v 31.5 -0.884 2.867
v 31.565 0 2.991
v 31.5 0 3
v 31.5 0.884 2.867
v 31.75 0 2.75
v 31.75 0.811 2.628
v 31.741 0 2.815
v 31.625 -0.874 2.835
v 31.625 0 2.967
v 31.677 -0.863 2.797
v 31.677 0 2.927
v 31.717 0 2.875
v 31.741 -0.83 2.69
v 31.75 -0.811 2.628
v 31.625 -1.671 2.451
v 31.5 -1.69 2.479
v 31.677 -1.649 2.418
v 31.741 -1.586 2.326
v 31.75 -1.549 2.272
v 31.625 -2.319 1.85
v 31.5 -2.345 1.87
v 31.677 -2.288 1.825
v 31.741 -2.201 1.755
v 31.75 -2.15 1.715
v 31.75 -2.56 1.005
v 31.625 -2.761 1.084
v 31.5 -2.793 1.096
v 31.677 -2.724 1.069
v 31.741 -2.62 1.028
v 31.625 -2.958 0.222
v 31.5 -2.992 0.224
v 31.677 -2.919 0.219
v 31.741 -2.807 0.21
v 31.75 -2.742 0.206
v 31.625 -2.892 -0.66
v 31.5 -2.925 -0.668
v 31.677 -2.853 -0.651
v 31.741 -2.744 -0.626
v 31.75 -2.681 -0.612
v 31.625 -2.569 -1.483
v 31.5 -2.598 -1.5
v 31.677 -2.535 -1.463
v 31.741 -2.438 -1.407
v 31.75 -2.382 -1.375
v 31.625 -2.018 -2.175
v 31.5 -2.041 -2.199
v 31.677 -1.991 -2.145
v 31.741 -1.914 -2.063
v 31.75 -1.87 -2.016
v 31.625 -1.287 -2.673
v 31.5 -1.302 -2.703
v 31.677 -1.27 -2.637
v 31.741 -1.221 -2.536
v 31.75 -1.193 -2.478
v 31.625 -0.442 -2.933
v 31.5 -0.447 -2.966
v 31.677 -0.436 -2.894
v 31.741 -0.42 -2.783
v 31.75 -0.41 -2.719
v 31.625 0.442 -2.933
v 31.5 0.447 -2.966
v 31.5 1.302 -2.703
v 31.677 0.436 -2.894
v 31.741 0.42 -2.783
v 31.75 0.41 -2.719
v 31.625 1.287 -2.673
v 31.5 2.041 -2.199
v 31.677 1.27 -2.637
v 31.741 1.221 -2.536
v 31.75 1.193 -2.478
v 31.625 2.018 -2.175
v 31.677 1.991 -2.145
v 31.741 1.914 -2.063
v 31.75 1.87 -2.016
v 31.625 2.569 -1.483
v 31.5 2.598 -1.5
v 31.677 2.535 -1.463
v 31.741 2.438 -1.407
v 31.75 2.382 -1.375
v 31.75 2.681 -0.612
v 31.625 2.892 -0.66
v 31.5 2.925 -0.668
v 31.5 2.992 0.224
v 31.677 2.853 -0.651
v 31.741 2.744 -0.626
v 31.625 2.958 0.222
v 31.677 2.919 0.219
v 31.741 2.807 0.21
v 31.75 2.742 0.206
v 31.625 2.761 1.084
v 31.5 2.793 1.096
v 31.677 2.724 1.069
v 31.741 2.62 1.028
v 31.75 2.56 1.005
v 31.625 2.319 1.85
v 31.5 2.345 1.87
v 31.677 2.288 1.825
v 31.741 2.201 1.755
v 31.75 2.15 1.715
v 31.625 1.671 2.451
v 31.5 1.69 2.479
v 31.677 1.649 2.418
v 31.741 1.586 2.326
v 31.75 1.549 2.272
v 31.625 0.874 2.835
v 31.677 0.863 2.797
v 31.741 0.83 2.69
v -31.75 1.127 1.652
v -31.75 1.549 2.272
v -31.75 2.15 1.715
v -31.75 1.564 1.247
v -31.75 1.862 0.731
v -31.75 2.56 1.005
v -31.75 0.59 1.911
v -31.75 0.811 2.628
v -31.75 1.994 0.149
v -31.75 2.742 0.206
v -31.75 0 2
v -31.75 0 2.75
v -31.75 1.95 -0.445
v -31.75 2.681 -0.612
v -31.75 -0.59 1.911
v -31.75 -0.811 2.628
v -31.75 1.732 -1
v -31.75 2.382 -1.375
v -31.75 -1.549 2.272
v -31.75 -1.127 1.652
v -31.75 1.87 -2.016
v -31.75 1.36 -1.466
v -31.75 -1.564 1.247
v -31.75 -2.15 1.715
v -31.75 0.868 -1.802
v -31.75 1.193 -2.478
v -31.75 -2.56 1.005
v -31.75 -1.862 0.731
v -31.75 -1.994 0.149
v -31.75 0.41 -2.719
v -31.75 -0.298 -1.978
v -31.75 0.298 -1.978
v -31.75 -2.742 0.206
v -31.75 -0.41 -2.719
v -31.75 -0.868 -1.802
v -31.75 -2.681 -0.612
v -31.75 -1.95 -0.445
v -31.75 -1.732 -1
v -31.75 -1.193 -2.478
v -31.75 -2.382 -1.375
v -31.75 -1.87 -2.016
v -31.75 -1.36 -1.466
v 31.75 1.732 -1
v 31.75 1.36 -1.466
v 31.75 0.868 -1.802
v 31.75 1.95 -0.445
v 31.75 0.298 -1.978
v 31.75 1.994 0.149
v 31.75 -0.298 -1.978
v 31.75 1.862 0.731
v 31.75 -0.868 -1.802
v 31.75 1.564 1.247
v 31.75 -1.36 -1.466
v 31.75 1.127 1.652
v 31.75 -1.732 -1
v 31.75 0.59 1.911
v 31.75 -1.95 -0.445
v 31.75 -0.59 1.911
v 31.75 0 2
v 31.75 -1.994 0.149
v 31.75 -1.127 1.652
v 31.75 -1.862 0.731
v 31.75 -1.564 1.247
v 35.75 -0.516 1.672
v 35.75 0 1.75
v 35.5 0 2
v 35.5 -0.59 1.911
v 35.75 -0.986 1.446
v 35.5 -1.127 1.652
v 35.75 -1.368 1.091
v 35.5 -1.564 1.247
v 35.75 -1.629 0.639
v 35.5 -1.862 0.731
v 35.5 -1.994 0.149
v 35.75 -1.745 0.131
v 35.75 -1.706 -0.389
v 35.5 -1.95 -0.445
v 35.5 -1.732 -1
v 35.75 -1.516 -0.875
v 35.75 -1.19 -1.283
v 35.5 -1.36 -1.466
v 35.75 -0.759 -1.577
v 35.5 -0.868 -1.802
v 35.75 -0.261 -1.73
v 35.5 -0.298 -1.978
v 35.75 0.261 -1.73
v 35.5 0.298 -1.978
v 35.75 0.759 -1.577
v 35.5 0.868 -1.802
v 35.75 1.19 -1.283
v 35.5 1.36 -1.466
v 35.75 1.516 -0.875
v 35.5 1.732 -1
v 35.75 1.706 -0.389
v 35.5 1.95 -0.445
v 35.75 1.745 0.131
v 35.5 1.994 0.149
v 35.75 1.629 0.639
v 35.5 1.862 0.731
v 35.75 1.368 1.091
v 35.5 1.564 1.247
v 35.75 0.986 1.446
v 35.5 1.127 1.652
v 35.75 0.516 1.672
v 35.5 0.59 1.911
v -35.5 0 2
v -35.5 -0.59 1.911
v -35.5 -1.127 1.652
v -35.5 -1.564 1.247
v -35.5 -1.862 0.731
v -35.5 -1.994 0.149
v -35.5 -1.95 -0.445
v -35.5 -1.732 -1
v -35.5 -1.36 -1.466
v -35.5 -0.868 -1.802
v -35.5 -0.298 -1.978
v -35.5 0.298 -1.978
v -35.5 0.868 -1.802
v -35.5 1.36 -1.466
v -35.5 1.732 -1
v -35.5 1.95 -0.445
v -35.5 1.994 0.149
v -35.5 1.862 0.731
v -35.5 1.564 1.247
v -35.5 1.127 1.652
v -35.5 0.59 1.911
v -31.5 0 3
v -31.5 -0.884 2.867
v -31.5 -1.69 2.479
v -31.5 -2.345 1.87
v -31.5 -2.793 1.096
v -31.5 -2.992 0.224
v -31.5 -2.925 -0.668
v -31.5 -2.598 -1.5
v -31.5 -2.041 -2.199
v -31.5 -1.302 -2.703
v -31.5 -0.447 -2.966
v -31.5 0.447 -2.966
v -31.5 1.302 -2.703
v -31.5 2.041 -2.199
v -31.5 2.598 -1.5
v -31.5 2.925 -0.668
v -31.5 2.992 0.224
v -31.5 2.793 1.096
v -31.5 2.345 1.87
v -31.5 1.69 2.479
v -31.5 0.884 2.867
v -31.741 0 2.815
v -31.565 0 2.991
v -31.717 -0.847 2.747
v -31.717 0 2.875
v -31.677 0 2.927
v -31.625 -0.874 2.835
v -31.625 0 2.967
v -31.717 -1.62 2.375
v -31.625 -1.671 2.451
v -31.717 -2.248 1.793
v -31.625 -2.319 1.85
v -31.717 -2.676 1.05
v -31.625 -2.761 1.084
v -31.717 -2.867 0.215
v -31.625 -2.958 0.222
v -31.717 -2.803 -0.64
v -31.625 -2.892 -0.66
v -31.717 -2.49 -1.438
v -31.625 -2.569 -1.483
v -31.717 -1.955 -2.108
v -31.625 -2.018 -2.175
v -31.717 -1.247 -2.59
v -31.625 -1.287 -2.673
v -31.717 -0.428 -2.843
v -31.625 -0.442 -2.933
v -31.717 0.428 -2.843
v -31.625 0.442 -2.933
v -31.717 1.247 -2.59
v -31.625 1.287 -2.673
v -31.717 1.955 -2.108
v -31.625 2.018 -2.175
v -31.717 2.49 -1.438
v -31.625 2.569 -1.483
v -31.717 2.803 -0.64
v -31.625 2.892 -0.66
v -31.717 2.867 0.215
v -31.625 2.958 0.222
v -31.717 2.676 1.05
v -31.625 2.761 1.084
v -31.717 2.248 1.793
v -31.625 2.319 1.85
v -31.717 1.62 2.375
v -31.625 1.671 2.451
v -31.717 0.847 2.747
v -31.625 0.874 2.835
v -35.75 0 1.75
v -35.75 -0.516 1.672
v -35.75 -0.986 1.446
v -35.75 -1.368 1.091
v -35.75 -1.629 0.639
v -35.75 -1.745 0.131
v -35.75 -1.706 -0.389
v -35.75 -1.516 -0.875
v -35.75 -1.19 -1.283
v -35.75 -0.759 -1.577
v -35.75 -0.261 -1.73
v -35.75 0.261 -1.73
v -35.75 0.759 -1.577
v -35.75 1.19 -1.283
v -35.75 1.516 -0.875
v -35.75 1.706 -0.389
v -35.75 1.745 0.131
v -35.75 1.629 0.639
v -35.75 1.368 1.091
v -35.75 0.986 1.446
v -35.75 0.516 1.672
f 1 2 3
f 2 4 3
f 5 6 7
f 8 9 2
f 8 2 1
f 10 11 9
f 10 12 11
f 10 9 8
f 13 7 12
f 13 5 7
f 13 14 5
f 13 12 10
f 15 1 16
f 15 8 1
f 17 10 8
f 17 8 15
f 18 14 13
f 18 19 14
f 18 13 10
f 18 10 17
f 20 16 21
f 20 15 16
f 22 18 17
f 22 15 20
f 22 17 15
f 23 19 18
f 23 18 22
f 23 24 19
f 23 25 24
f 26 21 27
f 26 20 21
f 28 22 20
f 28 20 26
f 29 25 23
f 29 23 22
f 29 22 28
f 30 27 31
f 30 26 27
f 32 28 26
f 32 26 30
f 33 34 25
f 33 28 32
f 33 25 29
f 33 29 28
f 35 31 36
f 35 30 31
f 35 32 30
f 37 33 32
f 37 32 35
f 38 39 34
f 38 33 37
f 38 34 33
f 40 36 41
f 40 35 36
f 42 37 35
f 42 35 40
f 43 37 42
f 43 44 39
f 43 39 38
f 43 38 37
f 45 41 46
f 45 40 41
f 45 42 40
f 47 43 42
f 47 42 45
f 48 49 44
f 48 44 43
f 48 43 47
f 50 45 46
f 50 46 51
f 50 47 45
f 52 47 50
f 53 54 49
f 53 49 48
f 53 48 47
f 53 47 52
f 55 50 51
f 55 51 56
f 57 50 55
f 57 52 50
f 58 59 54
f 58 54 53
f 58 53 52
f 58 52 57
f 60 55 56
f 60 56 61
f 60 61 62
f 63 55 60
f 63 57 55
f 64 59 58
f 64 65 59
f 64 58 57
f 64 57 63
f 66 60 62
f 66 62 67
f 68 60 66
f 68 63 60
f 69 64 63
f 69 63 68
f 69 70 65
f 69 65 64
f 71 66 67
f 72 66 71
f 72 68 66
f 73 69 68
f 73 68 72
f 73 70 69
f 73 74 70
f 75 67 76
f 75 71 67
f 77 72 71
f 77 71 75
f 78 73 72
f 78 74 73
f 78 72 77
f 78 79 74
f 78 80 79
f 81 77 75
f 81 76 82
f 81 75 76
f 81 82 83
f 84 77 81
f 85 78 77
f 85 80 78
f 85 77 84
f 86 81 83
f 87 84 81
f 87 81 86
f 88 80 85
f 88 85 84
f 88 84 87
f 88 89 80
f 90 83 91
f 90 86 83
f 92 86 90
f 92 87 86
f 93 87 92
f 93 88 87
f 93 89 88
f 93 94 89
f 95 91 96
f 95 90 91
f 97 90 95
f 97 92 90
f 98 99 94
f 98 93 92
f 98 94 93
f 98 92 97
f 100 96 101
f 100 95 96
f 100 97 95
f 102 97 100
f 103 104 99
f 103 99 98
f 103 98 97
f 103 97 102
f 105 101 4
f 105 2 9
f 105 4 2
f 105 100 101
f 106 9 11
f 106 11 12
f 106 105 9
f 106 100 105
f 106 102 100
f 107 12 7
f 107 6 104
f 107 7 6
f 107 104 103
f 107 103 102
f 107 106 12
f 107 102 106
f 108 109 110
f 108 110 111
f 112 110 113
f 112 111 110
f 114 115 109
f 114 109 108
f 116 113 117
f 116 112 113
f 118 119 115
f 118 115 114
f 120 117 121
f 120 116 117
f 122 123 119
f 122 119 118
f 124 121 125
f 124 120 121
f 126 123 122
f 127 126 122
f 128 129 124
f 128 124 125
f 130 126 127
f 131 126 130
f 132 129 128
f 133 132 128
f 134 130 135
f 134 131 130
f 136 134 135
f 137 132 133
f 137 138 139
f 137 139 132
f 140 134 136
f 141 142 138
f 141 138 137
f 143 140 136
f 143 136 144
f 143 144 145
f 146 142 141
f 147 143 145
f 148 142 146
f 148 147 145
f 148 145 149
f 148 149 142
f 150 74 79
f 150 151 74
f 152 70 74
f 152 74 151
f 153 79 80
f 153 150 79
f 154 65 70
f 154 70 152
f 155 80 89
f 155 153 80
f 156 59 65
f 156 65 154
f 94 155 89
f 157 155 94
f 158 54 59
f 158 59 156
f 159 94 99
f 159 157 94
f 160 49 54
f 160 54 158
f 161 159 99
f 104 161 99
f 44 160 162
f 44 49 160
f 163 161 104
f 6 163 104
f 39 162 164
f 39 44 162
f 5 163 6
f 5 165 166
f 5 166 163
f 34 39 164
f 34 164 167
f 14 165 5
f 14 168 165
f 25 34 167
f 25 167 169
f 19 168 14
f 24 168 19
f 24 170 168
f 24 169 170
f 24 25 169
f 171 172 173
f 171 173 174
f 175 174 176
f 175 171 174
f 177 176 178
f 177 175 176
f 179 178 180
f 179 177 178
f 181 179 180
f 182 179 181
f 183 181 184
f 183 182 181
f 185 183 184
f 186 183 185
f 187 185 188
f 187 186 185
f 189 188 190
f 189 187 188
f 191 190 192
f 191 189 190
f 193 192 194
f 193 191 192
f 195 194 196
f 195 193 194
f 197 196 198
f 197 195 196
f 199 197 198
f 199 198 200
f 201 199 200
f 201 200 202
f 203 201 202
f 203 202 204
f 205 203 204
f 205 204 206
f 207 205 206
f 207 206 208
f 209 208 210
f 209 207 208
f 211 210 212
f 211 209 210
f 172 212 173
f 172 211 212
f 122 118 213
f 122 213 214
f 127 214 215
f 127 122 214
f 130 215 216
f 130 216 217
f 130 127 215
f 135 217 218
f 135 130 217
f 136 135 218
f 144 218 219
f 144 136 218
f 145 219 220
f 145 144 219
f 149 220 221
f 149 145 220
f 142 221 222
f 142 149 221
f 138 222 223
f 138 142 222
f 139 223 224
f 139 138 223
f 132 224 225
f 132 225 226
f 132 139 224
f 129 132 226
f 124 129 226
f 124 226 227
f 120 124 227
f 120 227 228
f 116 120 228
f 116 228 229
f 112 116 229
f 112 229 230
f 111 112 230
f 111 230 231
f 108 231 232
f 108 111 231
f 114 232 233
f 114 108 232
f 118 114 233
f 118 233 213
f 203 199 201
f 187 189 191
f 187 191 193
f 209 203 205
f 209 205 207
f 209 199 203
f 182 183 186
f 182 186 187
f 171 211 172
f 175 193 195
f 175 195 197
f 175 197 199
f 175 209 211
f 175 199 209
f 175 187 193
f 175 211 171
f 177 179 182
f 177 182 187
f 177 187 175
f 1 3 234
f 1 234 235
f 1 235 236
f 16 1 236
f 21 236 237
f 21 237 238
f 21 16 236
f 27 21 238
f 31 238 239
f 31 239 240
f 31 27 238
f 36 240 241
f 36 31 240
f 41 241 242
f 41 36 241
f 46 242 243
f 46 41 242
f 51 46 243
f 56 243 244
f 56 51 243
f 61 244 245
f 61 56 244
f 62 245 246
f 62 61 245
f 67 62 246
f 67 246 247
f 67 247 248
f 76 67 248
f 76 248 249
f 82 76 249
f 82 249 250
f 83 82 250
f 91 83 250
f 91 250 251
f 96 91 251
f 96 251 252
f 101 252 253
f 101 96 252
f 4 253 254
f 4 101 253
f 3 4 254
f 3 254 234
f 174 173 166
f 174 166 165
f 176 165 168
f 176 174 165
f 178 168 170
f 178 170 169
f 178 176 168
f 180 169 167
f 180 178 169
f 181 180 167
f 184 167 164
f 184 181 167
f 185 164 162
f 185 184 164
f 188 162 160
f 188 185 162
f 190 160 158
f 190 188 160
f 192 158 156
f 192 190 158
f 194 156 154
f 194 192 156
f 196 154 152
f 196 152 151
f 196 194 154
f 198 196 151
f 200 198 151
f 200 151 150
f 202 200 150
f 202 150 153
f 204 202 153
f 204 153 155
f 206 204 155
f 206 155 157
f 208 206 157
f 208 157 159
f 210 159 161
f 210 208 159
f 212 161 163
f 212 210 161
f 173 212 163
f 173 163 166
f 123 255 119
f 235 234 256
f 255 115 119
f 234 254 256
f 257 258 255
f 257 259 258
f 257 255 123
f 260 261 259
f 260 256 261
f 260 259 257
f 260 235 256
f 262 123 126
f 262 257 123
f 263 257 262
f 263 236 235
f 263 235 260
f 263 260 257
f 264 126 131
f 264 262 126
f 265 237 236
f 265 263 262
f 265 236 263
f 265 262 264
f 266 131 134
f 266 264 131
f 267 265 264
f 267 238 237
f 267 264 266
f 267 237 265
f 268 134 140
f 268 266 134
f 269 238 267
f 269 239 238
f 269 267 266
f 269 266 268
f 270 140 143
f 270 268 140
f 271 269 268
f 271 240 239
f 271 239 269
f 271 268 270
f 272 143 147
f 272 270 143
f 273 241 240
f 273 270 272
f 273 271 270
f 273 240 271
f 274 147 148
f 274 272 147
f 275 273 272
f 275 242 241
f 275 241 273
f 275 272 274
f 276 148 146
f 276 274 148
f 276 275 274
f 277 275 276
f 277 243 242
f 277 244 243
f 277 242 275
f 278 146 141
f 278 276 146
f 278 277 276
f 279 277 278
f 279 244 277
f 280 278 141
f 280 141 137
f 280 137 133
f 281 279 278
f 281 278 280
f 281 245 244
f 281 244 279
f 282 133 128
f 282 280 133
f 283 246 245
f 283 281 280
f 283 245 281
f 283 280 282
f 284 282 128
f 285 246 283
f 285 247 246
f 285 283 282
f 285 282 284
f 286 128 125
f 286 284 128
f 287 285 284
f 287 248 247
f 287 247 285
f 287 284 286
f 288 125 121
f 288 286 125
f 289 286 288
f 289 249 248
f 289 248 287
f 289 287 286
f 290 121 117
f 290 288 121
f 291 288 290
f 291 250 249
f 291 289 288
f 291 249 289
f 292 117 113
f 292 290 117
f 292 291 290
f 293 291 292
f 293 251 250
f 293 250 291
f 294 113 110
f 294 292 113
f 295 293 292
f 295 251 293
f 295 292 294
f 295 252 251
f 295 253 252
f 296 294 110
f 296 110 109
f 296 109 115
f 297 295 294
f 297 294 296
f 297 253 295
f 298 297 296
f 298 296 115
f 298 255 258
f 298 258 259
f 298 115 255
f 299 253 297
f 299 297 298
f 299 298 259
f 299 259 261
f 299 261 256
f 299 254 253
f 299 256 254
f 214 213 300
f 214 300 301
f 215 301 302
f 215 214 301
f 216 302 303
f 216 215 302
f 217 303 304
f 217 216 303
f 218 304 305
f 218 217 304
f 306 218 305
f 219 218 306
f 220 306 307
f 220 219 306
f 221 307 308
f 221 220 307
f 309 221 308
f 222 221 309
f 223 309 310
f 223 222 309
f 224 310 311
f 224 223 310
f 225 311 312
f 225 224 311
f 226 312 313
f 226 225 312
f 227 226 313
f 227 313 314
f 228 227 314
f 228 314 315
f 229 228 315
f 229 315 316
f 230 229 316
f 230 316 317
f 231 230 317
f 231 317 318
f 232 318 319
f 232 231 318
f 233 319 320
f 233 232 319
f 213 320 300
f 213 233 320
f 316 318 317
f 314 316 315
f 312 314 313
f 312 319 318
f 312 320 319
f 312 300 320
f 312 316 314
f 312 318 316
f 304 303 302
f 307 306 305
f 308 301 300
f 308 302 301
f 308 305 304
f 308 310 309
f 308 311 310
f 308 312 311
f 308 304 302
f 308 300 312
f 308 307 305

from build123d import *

# Parameters (mm, degrees)
CHAMFER3_SIZE = 0.25
FILLET1_R     = 0.25


with BuildPart() as part:
    # Sketch1 → Revolve1 (revolve)
    with BuildSketch(Plane.XY, mode=Mode.PRIVATE) as revolve1_sk:
        Polygon((-35.75, 0), (-35.75, 2), (-31.75, 2), (-31.75, 3), (31.75, 3), (31.75, 2), (35.75, 2), (35.75, 0), align=None)
    revolve(revolve1_sk.sketch.rotate(Axis((-39.77575721, 0, 0), (1, 0, 0)), 90), axis=Axis((-39.77575721, 0, 0), (1, 0, 0)))

    # Chamfer3
    chamfer3_edges = [part.edges().sort_by_distance(p)[0] for p in [
        (35.75, 0, -2),
        (-35.75, 0, -2),
    ]]
    chamfer(chamfer3_edges, length=CHAMFER3_SIZE)

    # Fillet1
    fillet1_edges = [part.edges().sort_by_distance(p)[0] for p in [
        (31.75, 0, -3),
        (-31.75, 0, -3),
    ]]
    fillet(fillet1_edges, radius=FILLET1_R)


solid = part.part
